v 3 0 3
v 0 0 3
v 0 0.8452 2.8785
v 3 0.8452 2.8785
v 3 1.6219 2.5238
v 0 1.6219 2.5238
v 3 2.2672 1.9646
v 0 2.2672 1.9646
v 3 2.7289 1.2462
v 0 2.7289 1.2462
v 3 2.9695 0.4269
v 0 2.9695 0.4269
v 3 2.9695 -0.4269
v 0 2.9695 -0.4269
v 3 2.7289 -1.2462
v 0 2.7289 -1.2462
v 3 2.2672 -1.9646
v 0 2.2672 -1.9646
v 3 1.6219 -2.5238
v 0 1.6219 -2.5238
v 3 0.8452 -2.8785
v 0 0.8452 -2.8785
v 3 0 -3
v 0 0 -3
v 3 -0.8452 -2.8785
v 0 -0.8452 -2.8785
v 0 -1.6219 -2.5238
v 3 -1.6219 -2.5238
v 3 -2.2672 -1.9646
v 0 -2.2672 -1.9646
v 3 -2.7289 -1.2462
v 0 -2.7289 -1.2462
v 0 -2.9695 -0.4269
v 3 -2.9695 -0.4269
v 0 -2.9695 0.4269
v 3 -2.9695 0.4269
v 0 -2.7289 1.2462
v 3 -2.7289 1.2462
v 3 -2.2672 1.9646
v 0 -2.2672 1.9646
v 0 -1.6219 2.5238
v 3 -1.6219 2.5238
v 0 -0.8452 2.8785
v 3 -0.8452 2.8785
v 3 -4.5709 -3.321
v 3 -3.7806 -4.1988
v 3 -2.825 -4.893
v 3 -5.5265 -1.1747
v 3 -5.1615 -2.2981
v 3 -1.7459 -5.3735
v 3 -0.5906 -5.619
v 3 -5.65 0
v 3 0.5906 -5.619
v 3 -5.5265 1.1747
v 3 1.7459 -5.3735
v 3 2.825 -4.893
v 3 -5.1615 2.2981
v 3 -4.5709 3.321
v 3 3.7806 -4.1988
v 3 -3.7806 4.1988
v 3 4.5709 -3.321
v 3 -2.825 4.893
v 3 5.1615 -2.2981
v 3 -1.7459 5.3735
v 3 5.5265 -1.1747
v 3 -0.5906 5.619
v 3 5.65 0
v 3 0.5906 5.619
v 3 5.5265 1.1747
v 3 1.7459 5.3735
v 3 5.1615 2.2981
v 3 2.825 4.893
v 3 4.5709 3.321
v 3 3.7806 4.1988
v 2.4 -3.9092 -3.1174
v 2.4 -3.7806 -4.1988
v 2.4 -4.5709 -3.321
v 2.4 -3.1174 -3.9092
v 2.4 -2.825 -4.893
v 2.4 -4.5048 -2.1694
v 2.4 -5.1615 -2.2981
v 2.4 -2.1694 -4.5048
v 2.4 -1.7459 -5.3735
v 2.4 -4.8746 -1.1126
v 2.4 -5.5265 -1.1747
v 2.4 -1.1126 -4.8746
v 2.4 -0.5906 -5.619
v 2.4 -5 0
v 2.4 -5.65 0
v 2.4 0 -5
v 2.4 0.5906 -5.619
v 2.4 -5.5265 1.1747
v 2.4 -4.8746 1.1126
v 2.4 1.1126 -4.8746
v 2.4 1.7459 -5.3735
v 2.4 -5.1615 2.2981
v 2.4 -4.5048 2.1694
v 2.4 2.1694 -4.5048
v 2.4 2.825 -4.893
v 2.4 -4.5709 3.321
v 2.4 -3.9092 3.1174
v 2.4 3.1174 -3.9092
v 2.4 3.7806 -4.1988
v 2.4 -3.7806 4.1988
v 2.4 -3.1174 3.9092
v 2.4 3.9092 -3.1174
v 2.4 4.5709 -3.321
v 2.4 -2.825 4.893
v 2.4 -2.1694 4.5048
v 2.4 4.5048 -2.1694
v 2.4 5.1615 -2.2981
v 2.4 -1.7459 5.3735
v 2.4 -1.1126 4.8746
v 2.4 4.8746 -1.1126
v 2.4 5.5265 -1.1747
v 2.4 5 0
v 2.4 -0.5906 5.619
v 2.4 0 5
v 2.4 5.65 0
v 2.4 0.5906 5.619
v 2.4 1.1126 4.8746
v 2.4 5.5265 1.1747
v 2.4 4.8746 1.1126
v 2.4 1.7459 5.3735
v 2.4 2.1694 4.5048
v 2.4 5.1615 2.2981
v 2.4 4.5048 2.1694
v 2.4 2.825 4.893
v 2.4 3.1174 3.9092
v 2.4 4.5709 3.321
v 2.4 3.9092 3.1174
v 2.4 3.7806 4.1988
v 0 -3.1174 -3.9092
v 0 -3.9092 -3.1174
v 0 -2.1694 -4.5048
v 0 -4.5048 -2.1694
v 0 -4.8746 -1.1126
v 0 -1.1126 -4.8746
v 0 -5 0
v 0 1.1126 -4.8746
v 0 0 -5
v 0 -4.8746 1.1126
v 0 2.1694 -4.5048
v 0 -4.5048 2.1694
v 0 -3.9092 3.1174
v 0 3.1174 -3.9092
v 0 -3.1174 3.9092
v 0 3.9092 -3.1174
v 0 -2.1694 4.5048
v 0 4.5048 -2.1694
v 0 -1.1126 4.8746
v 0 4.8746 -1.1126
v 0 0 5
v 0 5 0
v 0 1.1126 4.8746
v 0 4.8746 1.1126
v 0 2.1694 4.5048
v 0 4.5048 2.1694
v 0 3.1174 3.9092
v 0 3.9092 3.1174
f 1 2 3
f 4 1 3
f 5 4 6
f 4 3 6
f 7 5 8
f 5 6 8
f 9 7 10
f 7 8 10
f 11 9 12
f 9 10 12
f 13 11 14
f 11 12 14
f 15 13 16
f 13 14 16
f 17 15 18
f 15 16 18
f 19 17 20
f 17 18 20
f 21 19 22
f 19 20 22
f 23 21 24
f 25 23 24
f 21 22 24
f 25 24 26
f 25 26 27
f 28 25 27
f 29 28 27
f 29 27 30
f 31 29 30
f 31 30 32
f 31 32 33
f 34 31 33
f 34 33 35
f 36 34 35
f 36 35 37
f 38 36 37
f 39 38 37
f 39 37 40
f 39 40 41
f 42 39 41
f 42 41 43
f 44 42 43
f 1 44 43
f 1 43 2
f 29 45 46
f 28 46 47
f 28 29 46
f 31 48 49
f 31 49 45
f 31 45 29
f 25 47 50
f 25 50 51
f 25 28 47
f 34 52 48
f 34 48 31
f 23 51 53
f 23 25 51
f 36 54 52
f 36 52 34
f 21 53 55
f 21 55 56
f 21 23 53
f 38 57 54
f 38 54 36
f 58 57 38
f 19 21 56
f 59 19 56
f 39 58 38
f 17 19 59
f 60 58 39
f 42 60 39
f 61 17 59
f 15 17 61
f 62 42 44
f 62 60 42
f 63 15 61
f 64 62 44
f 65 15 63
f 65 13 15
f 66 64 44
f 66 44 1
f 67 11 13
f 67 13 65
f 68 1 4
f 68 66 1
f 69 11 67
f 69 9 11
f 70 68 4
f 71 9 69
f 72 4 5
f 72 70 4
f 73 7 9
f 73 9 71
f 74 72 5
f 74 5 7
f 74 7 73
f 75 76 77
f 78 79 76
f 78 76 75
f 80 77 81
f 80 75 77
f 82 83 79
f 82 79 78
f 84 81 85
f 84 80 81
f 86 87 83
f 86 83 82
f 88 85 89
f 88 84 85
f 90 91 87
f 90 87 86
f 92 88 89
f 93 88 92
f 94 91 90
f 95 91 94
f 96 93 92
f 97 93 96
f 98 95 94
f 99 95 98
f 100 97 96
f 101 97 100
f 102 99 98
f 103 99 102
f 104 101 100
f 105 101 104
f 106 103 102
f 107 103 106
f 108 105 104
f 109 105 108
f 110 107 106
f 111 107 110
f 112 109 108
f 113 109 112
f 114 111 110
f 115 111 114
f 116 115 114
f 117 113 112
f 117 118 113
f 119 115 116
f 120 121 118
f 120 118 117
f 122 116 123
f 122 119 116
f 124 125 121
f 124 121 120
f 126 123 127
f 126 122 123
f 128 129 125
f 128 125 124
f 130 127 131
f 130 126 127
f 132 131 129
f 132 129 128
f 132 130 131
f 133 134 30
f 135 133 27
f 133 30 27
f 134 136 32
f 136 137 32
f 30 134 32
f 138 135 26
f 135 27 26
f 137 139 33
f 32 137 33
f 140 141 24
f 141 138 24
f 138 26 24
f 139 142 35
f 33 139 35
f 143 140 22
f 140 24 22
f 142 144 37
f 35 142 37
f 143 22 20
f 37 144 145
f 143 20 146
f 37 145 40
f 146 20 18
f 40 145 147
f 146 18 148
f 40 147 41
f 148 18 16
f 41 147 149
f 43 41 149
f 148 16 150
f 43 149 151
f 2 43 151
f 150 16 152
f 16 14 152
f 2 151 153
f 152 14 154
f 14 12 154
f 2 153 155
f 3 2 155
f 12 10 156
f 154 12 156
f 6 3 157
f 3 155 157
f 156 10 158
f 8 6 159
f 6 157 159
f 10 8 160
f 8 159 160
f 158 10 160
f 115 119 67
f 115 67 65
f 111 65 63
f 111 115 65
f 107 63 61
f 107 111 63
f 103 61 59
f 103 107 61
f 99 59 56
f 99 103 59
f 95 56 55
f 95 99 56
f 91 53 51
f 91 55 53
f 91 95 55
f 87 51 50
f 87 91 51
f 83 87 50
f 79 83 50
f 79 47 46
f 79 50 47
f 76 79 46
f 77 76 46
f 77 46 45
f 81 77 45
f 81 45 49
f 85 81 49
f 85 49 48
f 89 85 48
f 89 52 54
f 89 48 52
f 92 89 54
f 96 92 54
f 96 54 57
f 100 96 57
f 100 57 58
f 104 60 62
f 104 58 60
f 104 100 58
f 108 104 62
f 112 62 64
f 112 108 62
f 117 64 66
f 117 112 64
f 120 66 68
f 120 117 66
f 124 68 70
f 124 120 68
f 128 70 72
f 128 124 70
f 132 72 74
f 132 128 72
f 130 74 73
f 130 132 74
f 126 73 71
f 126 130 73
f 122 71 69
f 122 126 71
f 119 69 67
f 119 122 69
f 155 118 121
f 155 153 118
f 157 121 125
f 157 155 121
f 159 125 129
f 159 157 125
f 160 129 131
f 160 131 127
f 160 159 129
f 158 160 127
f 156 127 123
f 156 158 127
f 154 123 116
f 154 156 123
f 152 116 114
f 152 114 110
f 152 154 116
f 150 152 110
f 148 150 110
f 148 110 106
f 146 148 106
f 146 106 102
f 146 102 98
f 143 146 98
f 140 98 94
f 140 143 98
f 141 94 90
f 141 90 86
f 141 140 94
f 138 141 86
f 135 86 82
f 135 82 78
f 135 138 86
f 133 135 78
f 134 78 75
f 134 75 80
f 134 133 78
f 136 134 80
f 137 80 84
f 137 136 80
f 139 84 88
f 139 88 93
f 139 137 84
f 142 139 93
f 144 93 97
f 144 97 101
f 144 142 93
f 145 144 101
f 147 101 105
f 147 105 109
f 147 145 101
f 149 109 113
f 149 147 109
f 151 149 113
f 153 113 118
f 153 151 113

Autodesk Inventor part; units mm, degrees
ref_plane "YZ Plane" through (0, 0, 0) normal (1, 0, 0) x (0, 1, 0)
ref_plane "XZ Plane" through (0, 0, 0) normal (0, 1, 0) x (-1, 0, 0)
ref_plane "XY Plane" through (0, 0, 0) normal (0, 0, 1) x (1, 0, 0)
sketch "スケッチ1" plane through (0, 0, 0) normal (1, 0, 0) x (0, 1, 0)
  circle A0 centre (0, 0) radius 5.65
  dimension "d0" = 11.3
extrude "押し出し1" add sketch "スケッチ1" along normal blind 3
sketch "スケッチ2" plane through (0, 0, 0) normal (-1, 0, 0) x (0, 0, 1)
  circle A0 centre (0, 0) radius 5
  circle A1 centre (0, 0) radius 5.65
  dimension "d3" = 10
extrude "押し出し2" cut sketch "スケッチ2" against normal blind 2.4
sketch "スケッチ3" plane through (0, 0, 0) normal (-1, 0, 0) x (0, 0, 1)
  circle A0 centre (0, 0) radius 3
  dimension "d6" = 6
extrude "押し出し3" cut sketch "スケッチ3" against normal blind 3
properties part number "6mmベアリング"
